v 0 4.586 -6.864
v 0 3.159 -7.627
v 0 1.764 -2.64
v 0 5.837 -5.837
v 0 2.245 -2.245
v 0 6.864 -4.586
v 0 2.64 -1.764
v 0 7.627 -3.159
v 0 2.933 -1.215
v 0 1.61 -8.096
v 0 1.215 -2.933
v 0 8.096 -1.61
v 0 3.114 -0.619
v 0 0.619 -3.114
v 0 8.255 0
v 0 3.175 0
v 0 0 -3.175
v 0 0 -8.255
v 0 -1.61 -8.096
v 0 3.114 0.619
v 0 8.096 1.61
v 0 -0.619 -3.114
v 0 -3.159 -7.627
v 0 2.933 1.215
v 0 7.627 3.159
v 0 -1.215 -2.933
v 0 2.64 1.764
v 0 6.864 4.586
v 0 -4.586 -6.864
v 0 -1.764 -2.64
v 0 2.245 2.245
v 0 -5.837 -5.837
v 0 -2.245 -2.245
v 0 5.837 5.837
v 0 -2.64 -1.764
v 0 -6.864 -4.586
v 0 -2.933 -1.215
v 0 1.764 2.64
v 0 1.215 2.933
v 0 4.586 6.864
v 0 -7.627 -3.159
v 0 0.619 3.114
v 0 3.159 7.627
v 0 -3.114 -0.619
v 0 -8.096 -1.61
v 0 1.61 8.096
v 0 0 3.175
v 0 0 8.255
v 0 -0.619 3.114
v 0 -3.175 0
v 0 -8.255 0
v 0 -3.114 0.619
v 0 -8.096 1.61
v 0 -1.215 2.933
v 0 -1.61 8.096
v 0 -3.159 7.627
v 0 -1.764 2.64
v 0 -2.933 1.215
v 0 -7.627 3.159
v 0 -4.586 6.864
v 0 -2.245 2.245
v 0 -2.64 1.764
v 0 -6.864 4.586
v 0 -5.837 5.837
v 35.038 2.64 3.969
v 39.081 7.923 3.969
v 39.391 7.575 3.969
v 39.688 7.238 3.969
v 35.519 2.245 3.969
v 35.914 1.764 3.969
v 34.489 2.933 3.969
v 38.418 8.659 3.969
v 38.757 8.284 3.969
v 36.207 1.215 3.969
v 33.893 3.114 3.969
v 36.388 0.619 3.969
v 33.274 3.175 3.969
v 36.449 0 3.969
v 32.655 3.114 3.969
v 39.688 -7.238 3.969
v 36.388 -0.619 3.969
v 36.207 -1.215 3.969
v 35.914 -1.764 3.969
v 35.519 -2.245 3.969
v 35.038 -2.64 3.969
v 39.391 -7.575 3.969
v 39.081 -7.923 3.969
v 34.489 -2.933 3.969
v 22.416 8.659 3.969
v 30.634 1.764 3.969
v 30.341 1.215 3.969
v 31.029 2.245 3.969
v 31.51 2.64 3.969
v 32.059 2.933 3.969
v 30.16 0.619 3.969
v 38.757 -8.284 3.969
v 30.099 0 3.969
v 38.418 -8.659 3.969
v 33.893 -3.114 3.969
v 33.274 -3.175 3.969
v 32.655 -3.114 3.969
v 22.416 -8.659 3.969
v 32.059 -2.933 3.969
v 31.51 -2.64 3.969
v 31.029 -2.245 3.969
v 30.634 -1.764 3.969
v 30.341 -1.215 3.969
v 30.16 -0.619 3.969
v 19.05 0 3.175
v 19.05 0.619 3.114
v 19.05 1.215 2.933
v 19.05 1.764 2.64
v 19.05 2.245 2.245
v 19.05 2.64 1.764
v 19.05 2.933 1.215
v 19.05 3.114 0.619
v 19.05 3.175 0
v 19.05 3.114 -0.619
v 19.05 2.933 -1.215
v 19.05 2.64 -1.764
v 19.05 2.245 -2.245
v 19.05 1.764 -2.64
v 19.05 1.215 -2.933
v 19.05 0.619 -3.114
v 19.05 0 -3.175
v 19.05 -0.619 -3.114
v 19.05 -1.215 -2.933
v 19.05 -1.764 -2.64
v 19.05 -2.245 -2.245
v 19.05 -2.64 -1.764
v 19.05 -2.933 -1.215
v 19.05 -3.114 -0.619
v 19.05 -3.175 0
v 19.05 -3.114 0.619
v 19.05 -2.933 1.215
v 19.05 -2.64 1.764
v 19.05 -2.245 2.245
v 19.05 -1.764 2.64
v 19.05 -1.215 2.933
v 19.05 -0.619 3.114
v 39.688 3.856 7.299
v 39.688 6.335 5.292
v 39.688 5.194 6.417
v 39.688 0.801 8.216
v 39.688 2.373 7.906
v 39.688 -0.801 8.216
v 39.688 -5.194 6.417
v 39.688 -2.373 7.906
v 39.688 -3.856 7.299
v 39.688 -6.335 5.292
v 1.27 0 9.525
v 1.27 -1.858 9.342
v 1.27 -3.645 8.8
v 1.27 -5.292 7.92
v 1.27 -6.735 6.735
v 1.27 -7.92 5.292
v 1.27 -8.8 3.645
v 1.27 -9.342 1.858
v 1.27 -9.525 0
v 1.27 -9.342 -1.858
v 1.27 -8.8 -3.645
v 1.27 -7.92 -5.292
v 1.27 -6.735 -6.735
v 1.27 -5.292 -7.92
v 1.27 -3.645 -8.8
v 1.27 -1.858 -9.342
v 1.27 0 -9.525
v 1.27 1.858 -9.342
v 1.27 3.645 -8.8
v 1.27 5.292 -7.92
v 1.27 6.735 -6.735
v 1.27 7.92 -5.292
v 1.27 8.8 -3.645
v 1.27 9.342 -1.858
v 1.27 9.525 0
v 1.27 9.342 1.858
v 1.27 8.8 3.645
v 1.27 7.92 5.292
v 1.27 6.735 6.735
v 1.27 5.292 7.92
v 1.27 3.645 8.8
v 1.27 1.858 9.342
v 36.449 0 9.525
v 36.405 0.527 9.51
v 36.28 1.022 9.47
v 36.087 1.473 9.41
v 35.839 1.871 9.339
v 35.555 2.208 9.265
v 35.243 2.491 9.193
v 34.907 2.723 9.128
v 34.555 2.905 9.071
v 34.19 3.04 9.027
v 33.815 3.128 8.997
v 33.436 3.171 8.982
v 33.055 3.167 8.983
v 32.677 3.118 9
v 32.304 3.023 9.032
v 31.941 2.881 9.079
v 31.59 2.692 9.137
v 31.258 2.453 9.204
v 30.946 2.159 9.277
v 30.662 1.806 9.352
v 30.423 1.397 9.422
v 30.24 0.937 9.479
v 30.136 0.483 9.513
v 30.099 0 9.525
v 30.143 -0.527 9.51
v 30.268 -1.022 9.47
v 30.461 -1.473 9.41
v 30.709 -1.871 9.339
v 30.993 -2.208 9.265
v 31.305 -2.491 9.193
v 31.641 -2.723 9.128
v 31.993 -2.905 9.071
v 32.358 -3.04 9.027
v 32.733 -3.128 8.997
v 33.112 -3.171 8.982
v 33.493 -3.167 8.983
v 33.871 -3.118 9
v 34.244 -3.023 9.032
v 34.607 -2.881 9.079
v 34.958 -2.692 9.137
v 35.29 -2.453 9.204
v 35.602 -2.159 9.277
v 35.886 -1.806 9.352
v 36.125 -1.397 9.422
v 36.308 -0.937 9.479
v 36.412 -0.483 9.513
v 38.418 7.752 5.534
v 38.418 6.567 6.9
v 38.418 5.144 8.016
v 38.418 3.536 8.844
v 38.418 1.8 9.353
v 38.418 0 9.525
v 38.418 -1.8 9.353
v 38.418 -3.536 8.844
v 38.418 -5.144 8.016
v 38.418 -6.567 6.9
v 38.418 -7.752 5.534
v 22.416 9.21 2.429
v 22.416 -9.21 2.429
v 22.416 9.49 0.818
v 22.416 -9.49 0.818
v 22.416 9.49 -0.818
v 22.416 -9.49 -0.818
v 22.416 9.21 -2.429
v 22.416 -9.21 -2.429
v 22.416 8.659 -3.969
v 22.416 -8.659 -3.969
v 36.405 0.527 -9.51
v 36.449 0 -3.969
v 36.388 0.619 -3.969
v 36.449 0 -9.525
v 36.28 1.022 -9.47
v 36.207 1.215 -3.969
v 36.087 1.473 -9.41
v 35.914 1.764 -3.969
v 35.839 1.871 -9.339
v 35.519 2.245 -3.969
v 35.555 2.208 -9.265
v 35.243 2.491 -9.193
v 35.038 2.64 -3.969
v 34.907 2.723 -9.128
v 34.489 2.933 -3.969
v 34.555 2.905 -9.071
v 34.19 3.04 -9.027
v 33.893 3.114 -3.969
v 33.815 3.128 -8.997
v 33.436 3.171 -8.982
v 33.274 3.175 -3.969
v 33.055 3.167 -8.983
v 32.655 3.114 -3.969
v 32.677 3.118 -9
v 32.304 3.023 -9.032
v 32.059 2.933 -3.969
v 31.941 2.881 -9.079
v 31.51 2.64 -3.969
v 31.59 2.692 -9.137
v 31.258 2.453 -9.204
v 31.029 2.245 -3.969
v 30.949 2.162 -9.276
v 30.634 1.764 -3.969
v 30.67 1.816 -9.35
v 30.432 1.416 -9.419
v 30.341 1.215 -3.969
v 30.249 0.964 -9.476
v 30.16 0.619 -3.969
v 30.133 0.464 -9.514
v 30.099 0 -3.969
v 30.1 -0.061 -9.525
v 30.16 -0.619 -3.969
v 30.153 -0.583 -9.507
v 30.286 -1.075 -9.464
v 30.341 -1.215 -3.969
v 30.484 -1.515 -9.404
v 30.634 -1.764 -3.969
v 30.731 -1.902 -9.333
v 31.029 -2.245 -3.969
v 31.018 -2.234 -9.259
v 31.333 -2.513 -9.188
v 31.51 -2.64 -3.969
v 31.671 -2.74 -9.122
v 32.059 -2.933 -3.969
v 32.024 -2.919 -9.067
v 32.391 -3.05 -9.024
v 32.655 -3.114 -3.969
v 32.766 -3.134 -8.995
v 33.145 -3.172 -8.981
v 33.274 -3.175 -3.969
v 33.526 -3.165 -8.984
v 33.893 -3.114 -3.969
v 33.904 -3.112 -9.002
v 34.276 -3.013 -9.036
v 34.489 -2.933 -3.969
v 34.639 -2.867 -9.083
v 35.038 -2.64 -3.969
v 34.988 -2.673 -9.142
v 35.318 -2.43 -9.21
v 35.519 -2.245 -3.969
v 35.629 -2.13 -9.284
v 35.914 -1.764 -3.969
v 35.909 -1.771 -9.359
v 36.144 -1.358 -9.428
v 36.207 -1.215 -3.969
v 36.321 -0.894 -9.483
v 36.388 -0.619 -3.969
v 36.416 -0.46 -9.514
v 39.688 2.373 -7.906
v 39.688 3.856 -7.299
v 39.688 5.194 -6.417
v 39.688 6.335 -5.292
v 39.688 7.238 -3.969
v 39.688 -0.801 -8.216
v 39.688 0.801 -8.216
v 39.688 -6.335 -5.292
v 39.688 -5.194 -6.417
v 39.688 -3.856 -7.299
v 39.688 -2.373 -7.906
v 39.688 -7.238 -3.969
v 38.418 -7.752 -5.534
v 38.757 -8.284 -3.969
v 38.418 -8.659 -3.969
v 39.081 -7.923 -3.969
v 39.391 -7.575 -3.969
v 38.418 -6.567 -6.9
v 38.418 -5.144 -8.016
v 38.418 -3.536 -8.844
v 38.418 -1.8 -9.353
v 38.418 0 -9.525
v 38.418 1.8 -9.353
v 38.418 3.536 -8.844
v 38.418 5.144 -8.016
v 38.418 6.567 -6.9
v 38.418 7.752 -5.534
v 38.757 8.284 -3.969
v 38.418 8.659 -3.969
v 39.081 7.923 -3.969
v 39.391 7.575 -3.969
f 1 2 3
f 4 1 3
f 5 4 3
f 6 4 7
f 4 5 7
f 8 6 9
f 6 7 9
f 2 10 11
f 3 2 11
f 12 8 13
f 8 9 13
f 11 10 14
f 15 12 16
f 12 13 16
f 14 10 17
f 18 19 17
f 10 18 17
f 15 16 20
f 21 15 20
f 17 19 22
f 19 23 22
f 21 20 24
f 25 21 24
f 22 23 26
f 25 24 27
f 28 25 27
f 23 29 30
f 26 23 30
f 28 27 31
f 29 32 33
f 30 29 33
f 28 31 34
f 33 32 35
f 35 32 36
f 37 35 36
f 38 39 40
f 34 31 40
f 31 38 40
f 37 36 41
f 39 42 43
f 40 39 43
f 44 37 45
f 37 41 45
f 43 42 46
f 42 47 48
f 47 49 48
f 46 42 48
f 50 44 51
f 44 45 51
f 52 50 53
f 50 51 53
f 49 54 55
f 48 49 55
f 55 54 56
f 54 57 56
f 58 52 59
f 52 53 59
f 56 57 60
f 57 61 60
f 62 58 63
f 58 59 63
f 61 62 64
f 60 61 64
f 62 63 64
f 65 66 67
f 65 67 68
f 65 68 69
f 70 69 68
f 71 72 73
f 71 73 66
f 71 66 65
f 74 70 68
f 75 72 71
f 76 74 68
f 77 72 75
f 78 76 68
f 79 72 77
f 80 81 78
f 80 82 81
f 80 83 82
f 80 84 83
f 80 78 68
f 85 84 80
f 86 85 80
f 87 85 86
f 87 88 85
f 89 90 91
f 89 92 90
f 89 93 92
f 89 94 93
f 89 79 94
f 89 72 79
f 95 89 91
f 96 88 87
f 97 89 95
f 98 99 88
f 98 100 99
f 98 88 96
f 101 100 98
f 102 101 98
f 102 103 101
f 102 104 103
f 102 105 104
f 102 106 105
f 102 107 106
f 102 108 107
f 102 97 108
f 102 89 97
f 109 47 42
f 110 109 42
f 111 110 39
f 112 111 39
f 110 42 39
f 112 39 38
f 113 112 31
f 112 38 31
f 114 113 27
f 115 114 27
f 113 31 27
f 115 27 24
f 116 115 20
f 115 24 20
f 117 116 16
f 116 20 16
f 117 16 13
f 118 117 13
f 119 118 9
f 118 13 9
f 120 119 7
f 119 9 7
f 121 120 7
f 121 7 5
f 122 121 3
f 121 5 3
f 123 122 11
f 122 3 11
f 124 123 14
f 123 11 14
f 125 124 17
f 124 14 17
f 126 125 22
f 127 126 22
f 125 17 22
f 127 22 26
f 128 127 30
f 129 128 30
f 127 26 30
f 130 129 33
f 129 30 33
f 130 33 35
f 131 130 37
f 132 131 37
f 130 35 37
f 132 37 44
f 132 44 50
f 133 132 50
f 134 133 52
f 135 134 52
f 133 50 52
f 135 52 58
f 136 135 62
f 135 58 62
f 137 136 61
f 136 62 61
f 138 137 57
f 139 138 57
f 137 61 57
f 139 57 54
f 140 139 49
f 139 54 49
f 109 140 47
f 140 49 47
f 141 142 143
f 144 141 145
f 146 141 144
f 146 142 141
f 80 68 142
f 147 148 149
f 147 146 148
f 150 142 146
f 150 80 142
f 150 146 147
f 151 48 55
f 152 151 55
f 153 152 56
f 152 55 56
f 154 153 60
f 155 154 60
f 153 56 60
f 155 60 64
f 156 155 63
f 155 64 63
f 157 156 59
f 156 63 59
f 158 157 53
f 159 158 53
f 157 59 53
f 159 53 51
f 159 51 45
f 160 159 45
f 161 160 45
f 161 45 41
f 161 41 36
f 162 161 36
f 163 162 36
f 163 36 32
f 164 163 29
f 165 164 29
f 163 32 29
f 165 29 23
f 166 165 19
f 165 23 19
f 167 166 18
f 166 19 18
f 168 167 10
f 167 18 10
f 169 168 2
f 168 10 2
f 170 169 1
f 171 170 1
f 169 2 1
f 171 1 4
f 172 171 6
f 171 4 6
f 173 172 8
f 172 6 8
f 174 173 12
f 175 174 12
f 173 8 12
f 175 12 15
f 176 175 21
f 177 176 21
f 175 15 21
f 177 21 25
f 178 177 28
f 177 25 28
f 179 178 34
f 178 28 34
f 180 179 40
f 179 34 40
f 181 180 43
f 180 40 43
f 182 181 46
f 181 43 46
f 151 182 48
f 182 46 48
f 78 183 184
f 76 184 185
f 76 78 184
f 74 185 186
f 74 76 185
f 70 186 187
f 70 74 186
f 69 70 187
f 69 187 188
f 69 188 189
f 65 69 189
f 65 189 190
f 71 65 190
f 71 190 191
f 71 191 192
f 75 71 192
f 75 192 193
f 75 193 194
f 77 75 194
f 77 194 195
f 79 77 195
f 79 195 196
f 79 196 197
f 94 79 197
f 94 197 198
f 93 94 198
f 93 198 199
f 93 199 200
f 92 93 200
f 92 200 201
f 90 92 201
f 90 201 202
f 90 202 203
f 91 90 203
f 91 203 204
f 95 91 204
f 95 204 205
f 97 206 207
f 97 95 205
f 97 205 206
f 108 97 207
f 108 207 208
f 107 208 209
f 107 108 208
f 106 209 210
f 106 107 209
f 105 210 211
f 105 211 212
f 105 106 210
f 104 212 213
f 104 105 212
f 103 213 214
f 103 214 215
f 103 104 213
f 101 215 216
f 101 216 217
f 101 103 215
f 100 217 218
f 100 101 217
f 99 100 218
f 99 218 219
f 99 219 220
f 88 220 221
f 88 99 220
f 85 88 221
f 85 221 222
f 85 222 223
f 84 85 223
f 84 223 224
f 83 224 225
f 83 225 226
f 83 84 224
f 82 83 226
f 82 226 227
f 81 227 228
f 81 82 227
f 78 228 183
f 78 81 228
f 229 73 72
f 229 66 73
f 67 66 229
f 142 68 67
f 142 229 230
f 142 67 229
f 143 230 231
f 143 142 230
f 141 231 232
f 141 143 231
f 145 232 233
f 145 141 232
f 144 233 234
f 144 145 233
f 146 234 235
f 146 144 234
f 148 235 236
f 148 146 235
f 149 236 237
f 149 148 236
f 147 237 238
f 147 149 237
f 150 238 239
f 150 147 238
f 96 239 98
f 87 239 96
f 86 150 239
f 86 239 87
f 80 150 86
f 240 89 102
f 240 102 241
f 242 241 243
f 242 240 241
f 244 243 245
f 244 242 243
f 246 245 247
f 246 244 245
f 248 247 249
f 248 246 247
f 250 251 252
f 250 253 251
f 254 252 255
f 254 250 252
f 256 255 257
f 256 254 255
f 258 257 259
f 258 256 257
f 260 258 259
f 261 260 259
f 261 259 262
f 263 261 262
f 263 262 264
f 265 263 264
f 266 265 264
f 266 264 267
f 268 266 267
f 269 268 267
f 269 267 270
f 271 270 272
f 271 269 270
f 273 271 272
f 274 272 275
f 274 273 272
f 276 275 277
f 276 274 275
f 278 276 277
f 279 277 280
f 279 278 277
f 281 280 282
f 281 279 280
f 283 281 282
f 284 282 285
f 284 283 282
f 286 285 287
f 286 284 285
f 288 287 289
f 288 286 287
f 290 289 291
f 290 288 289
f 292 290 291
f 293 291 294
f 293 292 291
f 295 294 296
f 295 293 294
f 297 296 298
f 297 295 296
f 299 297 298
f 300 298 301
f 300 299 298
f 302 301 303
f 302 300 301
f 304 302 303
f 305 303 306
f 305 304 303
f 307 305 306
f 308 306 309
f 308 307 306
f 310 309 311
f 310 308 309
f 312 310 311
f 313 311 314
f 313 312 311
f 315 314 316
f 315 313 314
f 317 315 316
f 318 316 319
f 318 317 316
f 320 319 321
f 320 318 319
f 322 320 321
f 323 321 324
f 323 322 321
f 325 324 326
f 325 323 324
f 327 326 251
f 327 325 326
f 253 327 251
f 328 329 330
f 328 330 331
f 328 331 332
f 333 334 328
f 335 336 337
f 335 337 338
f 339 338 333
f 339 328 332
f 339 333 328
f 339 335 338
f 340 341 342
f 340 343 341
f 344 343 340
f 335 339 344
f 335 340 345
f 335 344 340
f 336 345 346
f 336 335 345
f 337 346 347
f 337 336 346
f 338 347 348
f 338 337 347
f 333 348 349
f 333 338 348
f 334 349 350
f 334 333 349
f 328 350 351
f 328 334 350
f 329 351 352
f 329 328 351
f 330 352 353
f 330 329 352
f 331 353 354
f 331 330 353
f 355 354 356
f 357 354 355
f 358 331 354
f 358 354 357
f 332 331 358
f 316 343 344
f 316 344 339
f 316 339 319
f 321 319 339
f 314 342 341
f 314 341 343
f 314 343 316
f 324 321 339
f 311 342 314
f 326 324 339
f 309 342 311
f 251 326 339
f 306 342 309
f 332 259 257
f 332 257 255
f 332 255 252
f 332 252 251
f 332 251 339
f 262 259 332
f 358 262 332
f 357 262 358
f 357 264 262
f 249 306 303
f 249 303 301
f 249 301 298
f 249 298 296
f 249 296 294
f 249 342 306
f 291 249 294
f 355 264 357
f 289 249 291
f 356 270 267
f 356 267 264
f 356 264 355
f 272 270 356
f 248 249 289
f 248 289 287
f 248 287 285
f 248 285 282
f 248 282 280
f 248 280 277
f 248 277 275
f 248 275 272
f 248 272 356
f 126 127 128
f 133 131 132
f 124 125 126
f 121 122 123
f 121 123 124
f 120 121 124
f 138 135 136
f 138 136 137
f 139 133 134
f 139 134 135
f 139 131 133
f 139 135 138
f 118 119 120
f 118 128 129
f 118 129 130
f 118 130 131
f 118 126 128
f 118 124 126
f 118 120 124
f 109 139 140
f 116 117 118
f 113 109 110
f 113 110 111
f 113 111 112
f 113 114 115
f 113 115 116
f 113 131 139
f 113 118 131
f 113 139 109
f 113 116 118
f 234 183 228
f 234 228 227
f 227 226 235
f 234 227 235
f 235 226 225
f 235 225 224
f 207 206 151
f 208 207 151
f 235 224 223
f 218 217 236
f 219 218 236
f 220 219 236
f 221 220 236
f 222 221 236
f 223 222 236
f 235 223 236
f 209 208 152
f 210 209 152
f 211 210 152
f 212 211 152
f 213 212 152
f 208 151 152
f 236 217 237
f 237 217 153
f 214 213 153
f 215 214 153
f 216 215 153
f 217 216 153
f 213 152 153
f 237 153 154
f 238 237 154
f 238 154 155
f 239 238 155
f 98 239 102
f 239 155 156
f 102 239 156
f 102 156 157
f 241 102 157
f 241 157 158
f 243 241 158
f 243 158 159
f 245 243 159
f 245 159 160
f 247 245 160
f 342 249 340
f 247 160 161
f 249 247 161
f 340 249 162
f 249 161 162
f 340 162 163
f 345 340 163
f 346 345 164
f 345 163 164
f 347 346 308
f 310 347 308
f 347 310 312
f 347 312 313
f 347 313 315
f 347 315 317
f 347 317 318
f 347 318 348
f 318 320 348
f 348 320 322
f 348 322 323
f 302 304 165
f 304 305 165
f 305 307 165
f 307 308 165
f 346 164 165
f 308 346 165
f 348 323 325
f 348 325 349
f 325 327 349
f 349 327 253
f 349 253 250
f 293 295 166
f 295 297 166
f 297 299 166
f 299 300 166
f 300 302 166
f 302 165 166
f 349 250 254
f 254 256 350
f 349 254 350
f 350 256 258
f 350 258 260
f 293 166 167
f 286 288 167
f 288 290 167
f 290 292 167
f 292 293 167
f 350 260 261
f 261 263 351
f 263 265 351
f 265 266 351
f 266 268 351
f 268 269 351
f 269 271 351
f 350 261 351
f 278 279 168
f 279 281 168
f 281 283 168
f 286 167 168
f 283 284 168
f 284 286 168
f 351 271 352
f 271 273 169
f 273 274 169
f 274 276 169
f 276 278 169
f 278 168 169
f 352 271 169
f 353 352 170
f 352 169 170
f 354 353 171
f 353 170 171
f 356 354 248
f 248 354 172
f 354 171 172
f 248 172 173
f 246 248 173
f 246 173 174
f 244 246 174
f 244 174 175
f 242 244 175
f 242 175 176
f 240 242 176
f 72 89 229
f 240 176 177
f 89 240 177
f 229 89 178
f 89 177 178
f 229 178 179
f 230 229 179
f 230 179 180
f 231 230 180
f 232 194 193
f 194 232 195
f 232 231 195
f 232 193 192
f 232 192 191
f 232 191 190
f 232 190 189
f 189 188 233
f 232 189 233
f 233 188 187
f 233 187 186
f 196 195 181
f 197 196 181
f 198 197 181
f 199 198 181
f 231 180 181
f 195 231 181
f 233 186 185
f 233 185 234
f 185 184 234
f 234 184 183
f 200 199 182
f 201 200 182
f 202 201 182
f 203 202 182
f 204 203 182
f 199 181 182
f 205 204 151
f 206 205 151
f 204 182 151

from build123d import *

# Parameters (mm, degrees)
SKETCH1_R               = 9.525
BASE_EXTRUDE_DEPTH      = 39.6875
CUT_EXTRUDE1_START      = -17.272
CUT_EXTRUDE1_DEPTH      = 17.272
CUT_EXTRUDE2_DEPTH      = 42.911202634
CUT_EXTRUDE2_DEPTH_BACK = 42.911202634
SKETCH3_R               = 3.175
CHAMFER1_SIZE           = 1.27
SKETCH4_R               = 3.175
CUT_EXTRUDE3_DEPTH      = 19.05


with BuildPart() as part:
    # Sketch1 → Base-Extrude (new body)
    with BuildSketch(Plane(origin=(0, 0, 0), x_dir=(0, 0, -1), z_dir=(1, 0, 0))):
        with Locations(Location((0, 0, 0), (0, 0, 180))):
            Circle(SKETCH1_R)
    extrude(amount=BASE_EXTRUDE_DEPTH)

    # Sketch2 → Cut-Extrude1 (cut)
    with BuildSketch(Plane(origin=(39.6875, 0, 0), x_dir=(0, 0, -1), z_dir=(1, 0, 0)).offset(CUT_EXTRUDE1_START)):
        with BuildLine():
            Line((-3.96875, 8.658790241), (-3.96875, -8.658790241))
            ThreePointArc((-3.96875, -8.658790241), (0, -9.525), (3.96875, -8.658790241))
            Line((3.96875, -8.658790241), (3.96875, 8.658790241))
            ThreePointArc((3.96875, 8.658790241), (0, 9.525), (-3.96875, 8.658790241))
        make_face()
    extrude(amount=CUT_EXTRUDE1_DEPTH, mode=Mode.SUBTRACT)

    # Sketch3 → Cut-Extrude2 (cut, two sides: drawn at the far end of the back side and taken through both)
    with BuildSketch(Plane.XY.offset(-CUT_EXTRUDE2_DEPTH_BACK)):
        with Locations((33.274, 0)):
            Circle(SKETCH3_R)
    extrude(amount=CUT_EXTRUDE2_DEPTH + CUT_EXTRUDE2_DEPTH_BACK, mode=Mode.SUBTRACT)

    # Chamfer1
    chamfer1_edges = [part.edges().sort_by_distance(p)[0] for p in [
        (0, 0, -9.525),
        (39.6875, -5.144087929, 8.016482045),
        (39.6875, 0, -9.525),
    ]]
    chamfer(chamfer1_edges, length=CHAMFER1_SIZE)

    # Sketch4 → Cut-Extrude3 (cut)
    with BuildSketch(Plane.ZY):
        Circle(SKETCH4_R)
    extrude(amount=-CUT_EXTRUDE3_DEPTH, mode=Mode.SUBTRACT)


solid = part.part
